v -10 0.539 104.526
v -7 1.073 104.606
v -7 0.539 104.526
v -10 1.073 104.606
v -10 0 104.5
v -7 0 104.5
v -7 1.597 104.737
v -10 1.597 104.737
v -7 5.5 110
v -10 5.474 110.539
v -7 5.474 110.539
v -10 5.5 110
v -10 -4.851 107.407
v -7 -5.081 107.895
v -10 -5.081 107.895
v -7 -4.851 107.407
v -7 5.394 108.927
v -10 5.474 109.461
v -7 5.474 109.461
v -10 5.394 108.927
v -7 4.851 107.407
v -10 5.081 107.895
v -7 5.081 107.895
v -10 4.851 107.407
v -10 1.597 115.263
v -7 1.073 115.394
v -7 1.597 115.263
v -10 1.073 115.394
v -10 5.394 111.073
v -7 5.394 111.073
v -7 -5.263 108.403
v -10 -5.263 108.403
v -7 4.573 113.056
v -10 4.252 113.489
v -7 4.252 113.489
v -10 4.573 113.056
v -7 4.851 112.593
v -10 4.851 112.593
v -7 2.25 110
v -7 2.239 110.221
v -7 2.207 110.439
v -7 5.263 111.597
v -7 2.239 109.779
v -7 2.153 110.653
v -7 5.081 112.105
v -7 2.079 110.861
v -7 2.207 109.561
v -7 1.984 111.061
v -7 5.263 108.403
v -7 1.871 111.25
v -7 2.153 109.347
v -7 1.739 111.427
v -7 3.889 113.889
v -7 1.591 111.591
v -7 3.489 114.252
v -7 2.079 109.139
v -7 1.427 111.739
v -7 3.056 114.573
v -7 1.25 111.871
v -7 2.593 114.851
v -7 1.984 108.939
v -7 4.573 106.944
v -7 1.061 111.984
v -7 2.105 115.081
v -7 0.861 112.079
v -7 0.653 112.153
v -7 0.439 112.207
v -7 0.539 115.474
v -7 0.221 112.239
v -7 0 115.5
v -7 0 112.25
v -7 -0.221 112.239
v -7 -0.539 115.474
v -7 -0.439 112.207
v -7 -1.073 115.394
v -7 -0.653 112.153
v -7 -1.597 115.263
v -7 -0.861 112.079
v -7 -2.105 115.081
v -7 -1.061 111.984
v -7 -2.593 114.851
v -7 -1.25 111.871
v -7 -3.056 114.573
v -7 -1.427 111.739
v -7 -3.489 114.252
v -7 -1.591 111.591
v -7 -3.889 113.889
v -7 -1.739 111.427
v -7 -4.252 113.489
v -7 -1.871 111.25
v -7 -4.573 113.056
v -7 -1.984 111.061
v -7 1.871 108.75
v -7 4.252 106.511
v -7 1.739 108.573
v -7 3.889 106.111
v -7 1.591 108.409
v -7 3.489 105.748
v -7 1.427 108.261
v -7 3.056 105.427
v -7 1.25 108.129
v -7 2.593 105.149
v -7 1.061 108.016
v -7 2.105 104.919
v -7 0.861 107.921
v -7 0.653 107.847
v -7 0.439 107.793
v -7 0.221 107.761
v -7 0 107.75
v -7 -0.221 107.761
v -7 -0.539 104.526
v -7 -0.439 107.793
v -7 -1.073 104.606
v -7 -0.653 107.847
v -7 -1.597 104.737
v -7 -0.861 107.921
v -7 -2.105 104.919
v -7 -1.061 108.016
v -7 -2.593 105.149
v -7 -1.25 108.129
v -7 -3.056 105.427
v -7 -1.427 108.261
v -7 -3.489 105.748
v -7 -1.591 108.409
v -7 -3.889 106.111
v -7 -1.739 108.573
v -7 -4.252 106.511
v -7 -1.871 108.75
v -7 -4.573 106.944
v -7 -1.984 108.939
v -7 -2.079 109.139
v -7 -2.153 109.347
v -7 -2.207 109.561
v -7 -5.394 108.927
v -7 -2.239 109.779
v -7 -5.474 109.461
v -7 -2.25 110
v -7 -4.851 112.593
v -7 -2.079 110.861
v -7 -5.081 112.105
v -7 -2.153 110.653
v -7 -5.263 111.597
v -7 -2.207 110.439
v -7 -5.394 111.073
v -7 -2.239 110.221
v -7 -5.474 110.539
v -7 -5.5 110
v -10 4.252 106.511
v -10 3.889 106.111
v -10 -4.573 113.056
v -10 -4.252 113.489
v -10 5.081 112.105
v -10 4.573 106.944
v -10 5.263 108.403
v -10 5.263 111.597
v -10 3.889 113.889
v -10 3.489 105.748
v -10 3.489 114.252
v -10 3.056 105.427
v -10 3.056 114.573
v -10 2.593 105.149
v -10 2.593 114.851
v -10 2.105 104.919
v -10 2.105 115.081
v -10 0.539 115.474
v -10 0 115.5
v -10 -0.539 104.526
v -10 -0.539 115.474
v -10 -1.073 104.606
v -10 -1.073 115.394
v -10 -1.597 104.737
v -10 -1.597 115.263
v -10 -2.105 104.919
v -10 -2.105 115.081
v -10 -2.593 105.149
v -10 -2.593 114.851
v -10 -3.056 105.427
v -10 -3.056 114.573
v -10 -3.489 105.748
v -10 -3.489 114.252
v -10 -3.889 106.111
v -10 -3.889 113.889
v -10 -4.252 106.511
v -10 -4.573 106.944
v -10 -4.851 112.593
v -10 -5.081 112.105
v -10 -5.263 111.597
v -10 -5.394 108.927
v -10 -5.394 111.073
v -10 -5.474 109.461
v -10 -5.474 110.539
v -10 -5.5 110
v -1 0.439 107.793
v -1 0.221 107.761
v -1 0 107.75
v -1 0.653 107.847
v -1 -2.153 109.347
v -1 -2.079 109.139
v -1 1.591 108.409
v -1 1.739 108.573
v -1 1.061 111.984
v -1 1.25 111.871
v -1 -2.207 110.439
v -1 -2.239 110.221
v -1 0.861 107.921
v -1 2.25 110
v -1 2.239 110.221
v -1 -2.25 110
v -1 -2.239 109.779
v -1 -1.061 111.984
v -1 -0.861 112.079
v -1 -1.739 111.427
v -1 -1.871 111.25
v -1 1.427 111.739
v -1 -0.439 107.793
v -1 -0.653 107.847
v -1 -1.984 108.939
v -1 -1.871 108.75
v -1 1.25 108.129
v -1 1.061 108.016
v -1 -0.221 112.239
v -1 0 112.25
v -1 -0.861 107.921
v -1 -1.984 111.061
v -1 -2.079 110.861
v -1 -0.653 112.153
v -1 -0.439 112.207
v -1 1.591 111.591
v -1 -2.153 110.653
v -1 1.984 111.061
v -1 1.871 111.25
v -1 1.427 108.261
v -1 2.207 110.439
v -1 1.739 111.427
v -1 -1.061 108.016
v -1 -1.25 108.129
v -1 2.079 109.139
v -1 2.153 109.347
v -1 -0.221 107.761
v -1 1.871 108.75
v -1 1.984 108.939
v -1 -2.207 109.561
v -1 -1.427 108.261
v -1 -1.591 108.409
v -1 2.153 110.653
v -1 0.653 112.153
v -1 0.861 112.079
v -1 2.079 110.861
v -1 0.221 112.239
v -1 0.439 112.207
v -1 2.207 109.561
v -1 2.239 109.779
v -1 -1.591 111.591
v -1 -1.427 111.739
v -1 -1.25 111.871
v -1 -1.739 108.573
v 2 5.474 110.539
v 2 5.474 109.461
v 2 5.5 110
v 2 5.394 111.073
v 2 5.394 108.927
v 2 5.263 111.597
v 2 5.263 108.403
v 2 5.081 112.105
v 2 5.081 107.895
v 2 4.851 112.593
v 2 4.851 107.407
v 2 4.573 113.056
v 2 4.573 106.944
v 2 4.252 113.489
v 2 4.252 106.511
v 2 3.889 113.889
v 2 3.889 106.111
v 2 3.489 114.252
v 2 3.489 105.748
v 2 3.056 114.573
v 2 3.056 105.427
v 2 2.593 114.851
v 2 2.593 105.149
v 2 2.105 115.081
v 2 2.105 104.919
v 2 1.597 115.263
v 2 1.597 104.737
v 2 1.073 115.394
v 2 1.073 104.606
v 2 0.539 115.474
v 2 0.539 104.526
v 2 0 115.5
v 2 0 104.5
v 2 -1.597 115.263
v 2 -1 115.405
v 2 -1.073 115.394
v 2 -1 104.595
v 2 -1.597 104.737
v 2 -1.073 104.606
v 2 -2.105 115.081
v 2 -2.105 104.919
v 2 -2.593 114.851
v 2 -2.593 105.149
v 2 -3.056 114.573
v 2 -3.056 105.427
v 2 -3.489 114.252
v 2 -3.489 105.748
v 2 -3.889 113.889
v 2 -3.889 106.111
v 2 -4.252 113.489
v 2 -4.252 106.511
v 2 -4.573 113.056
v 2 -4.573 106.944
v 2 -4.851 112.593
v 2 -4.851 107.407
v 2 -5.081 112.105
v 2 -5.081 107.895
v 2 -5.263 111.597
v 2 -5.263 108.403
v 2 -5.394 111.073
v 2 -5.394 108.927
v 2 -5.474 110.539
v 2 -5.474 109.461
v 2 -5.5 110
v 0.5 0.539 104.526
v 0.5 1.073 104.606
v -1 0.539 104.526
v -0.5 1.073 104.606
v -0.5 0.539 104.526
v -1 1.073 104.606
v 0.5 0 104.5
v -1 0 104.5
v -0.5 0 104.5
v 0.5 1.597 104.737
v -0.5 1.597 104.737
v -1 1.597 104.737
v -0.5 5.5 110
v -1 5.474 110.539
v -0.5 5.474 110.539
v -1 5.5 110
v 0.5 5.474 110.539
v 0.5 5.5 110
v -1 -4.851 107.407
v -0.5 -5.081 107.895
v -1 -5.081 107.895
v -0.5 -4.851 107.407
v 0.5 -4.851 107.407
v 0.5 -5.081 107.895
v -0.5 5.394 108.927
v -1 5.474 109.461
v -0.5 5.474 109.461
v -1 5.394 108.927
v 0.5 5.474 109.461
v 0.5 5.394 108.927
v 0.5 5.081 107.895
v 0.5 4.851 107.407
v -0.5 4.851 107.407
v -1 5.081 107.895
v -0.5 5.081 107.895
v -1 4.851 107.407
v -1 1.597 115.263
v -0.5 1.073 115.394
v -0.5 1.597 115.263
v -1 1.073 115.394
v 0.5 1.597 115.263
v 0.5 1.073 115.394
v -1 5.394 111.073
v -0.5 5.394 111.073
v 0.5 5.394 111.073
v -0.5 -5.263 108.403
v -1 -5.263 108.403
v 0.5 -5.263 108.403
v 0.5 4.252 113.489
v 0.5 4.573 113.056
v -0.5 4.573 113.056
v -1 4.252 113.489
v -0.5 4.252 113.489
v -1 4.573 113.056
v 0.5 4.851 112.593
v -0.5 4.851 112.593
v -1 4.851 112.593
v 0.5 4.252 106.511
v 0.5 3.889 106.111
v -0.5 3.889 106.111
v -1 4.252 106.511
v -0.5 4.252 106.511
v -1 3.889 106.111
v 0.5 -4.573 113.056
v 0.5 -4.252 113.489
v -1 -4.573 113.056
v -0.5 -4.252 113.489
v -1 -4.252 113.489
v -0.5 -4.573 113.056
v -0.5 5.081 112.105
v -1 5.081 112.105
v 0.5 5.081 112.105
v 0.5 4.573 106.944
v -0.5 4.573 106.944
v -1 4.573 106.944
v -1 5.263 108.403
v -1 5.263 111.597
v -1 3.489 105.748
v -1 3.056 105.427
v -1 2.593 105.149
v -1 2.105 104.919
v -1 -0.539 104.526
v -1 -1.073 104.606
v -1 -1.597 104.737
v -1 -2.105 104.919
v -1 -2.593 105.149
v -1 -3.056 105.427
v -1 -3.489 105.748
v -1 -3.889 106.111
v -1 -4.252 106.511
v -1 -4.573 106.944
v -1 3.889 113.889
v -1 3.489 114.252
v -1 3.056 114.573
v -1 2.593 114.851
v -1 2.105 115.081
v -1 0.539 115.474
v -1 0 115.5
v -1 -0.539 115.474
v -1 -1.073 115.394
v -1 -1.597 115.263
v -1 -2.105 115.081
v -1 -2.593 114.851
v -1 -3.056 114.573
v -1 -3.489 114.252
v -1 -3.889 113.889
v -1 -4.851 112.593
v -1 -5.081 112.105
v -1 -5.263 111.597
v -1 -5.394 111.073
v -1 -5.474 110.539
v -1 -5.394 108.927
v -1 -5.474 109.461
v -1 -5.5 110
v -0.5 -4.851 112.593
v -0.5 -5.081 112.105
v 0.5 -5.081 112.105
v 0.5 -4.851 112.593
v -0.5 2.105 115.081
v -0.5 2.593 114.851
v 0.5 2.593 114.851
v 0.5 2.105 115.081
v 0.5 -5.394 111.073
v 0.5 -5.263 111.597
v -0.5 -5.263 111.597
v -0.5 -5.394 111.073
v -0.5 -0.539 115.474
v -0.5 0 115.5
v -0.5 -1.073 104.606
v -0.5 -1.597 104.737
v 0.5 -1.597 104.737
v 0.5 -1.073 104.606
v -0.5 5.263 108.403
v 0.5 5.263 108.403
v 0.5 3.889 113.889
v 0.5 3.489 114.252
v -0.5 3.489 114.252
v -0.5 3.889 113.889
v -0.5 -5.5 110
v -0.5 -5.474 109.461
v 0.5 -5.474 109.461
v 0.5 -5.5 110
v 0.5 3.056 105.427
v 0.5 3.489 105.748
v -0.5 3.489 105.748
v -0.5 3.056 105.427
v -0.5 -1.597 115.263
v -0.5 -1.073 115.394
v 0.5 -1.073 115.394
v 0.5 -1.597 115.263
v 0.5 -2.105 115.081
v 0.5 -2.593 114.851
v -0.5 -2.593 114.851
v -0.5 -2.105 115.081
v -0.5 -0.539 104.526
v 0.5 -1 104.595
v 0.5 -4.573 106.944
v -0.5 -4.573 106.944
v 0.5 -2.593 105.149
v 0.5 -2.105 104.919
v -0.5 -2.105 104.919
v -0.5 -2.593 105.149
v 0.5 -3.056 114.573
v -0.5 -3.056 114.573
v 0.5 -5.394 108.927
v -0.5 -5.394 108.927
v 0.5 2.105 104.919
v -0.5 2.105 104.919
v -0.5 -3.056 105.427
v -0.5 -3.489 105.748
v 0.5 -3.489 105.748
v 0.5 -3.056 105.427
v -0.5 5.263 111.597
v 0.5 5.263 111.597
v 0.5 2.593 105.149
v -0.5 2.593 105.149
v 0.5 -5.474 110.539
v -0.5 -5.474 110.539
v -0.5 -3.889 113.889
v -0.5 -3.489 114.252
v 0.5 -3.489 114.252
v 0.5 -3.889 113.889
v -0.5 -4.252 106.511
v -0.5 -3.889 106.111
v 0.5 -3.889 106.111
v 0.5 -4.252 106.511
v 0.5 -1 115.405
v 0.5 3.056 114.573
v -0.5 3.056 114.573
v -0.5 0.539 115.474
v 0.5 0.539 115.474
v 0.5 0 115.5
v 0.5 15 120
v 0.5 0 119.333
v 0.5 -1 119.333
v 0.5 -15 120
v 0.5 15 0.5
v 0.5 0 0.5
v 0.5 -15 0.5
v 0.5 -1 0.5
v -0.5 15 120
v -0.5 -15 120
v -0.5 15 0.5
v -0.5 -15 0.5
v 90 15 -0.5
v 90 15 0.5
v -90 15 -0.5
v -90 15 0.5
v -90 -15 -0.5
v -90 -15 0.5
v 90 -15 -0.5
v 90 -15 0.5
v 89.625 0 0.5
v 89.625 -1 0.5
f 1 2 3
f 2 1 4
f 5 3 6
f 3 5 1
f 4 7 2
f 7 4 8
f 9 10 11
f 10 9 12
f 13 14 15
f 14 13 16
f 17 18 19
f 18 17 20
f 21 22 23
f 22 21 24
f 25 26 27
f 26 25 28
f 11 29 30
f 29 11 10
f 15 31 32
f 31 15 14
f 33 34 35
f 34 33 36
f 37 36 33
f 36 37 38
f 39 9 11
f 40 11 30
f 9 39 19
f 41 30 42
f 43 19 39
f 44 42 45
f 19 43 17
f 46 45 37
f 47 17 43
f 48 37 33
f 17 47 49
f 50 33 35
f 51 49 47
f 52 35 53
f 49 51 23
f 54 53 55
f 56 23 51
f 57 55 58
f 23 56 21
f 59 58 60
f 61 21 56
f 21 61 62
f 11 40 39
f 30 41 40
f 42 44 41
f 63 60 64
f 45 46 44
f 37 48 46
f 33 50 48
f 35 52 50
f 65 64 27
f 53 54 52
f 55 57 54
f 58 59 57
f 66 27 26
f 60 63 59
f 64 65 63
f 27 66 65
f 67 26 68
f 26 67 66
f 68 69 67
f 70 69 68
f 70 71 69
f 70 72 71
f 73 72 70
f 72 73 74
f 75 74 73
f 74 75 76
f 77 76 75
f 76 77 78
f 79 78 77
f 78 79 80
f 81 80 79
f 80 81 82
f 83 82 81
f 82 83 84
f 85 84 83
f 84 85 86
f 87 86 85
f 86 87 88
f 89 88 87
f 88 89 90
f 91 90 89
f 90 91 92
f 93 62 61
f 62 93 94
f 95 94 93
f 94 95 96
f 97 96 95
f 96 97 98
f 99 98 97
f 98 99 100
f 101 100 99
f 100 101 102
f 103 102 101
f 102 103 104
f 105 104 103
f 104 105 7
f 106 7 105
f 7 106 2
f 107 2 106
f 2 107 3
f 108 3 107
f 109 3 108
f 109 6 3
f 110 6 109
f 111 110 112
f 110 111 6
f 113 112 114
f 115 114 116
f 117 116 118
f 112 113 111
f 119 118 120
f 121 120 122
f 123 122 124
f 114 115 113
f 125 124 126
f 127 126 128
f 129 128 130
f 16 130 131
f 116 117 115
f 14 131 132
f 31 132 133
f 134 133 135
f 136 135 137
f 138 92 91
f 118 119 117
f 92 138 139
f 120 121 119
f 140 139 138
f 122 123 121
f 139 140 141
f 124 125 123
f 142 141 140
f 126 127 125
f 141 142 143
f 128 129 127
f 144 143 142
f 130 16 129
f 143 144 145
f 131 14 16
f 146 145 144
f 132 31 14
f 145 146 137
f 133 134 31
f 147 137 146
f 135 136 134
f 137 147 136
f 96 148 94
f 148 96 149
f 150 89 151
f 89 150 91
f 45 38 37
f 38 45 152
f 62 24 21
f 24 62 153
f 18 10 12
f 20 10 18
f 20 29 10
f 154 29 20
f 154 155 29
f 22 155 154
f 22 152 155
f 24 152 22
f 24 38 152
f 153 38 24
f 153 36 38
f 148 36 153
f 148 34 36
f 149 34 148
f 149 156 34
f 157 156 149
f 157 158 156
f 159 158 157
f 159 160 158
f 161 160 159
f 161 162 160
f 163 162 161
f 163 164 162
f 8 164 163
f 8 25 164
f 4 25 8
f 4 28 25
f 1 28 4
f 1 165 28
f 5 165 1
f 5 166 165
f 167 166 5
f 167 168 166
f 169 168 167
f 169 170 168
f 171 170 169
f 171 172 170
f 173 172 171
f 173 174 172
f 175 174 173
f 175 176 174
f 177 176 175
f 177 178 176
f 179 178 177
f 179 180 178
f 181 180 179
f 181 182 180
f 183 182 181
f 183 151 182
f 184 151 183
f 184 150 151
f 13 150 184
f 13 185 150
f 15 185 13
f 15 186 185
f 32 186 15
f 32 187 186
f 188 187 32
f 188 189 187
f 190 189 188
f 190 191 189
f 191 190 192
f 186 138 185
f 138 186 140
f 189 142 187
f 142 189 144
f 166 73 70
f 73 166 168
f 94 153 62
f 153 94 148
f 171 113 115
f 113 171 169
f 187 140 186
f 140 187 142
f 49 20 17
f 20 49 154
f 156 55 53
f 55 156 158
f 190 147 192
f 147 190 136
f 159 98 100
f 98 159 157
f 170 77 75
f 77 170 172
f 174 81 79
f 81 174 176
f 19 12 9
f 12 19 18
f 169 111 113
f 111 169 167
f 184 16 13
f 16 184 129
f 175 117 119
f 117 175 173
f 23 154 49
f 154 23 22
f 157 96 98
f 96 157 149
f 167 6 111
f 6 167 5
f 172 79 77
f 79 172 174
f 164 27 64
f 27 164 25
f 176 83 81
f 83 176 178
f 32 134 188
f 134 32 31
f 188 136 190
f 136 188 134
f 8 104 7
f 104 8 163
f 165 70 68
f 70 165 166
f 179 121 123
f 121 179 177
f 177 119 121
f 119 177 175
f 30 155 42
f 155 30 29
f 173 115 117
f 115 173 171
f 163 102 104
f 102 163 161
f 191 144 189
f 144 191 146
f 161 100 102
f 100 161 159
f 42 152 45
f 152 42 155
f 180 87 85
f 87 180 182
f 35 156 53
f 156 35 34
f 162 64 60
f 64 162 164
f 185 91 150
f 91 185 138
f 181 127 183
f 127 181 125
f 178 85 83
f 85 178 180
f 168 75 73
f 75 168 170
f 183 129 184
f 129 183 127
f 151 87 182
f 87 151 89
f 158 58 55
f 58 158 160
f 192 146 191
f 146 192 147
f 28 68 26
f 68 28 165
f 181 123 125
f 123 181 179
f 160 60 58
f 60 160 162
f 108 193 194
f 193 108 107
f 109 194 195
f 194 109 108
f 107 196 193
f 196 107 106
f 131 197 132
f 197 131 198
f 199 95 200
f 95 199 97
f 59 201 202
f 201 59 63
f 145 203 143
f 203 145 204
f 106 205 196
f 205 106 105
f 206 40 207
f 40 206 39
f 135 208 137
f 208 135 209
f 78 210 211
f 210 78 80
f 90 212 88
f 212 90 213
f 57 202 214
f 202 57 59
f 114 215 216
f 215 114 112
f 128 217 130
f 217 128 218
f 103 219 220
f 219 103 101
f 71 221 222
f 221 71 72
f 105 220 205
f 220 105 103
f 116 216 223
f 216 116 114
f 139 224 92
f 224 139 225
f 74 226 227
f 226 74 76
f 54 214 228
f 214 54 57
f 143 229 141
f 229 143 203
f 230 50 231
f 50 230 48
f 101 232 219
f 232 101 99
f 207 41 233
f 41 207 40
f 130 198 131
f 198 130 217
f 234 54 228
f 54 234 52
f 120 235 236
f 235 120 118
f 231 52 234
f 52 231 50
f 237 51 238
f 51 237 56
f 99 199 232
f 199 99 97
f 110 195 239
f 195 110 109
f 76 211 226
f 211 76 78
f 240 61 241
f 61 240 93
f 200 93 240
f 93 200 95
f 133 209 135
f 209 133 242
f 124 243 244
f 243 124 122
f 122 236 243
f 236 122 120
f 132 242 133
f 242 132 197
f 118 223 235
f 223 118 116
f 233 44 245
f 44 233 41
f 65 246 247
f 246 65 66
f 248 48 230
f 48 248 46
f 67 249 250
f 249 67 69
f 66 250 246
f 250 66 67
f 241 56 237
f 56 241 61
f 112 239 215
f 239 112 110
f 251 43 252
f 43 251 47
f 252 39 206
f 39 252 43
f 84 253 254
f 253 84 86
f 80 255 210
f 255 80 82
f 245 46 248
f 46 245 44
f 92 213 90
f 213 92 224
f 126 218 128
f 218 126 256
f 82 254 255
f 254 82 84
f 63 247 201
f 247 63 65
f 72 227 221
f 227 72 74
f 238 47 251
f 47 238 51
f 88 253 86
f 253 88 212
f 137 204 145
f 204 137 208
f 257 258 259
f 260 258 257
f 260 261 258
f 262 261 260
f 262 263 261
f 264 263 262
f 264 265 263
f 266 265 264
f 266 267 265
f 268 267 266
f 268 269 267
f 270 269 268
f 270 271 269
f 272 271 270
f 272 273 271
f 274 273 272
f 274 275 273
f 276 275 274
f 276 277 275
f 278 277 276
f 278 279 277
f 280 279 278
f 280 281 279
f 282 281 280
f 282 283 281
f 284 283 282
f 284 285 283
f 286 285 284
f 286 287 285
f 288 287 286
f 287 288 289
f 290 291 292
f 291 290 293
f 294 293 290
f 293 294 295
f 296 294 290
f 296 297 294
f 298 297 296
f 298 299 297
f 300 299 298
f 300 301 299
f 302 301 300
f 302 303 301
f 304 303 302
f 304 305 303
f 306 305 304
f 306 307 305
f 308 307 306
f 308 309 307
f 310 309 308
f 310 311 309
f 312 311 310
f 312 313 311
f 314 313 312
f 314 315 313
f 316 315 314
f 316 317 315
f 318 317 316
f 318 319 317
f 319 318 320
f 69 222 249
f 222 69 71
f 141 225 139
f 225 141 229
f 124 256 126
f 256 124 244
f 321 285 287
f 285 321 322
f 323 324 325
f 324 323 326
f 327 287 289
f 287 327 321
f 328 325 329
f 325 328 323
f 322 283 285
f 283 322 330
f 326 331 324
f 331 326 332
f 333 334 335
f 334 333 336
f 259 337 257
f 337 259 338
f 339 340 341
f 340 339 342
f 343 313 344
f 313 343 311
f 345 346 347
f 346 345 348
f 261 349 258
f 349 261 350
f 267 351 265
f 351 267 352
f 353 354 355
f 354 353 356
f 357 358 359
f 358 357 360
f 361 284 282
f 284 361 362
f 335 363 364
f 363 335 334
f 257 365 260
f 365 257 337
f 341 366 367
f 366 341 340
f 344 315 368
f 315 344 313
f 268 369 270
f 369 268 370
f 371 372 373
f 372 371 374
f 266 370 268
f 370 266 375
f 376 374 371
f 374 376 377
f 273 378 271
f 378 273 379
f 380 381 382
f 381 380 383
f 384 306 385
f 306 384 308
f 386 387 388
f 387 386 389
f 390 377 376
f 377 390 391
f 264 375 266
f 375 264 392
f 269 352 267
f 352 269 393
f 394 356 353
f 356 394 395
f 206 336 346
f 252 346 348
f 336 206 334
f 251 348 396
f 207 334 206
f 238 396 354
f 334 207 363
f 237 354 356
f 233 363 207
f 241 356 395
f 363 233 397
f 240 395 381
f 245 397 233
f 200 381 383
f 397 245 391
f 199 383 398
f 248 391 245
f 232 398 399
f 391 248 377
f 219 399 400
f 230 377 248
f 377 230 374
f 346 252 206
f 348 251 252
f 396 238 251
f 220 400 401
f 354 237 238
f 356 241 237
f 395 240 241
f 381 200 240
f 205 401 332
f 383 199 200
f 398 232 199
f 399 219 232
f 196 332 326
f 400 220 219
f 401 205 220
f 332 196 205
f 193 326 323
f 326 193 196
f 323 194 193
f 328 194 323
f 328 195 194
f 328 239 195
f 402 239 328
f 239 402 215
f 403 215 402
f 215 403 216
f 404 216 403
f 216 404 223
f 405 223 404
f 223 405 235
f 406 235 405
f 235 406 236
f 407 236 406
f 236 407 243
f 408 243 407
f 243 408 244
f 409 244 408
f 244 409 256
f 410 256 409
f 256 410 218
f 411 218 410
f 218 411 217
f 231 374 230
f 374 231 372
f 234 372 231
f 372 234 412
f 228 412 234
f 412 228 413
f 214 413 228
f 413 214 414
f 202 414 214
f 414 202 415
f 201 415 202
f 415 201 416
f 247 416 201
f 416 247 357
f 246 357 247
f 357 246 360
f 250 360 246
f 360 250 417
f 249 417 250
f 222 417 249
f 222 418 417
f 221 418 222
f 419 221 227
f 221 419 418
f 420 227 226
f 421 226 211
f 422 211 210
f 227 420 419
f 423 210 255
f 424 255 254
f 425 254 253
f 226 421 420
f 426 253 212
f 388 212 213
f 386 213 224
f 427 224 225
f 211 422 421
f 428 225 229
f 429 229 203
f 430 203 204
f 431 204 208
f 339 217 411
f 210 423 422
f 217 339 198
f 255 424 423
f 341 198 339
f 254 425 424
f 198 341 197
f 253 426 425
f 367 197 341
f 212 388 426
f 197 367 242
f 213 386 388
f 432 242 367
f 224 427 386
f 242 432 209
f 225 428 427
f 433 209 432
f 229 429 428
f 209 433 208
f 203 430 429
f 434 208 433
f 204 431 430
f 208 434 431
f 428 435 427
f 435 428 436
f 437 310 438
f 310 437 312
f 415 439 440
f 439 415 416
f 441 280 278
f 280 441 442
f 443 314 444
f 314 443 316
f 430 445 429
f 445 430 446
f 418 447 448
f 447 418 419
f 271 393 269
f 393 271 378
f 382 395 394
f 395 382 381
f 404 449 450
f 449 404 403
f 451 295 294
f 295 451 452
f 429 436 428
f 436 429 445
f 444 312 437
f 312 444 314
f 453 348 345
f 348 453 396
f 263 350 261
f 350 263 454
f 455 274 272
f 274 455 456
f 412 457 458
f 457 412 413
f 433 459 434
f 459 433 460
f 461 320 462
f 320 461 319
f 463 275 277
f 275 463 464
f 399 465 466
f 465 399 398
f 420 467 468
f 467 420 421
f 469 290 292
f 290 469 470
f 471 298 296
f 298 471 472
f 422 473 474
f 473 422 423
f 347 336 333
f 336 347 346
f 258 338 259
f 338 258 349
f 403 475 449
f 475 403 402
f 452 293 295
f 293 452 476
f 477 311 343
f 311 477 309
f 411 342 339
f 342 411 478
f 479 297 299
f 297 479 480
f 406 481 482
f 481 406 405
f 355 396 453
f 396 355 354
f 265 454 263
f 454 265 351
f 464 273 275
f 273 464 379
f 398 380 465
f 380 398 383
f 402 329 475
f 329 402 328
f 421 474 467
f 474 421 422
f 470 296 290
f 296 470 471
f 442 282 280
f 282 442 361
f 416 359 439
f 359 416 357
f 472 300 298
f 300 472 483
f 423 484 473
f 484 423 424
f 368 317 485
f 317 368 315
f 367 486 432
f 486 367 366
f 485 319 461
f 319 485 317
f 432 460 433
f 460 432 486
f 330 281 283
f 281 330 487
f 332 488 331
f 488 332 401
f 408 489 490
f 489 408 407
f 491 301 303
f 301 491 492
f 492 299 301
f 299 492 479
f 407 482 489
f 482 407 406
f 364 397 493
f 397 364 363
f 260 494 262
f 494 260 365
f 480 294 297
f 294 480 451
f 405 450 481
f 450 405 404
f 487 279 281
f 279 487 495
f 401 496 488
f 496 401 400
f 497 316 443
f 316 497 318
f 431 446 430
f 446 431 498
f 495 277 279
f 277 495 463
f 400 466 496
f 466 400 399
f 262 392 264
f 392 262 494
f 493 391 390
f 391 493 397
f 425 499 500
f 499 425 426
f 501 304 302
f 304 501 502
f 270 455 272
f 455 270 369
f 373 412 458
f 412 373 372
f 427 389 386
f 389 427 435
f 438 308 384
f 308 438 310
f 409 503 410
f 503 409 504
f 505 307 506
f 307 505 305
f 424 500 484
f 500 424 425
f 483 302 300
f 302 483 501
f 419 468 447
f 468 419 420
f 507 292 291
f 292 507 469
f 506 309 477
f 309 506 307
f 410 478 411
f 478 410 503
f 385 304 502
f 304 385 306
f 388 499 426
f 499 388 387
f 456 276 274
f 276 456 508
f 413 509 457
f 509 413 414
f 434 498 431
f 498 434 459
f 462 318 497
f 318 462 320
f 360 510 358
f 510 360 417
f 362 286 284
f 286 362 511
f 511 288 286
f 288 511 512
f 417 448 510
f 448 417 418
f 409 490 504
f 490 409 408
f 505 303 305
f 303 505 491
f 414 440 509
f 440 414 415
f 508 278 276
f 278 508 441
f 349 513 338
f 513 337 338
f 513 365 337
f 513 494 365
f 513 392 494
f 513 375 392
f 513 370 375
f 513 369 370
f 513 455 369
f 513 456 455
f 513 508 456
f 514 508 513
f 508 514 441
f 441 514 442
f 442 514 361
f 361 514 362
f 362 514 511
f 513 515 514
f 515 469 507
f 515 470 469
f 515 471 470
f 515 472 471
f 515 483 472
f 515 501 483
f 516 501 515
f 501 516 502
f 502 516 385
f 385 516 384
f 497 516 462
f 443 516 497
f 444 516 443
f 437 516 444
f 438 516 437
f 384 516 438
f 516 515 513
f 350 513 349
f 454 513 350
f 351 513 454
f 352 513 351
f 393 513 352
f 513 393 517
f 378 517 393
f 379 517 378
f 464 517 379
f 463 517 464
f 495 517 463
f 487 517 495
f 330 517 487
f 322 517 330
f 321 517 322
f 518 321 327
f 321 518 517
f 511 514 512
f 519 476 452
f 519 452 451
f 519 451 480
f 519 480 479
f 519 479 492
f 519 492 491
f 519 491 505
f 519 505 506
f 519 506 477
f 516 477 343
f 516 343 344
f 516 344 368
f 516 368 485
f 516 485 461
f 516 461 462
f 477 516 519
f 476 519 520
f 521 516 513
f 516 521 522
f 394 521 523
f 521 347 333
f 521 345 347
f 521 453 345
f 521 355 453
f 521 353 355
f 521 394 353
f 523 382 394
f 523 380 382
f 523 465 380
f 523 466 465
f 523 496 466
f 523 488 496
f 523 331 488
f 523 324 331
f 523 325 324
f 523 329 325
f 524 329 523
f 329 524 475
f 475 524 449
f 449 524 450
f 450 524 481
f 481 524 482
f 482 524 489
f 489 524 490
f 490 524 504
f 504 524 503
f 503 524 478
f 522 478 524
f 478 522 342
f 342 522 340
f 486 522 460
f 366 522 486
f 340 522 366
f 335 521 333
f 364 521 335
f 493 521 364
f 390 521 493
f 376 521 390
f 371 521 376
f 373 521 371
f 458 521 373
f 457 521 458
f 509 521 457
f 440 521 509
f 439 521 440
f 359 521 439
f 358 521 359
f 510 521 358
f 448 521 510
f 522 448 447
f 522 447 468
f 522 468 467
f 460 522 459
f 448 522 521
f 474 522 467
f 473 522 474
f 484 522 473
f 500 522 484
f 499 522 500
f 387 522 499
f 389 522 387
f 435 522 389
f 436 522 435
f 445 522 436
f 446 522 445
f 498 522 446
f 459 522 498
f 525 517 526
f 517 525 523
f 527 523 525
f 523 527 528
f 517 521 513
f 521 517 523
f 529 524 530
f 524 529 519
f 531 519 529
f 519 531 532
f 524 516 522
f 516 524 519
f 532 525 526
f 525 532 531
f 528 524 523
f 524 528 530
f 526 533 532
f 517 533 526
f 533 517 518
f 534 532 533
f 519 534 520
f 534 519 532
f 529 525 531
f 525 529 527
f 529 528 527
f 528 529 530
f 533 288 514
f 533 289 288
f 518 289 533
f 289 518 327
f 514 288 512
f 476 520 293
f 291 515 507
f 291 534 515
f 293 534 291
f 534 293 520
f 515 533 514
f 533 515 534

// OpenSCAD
// file: screwhang.scad
module screwhang()
{
    translate([0,0,1.5])cylinder(d=11, h=3,center=true, $fn=64);
    translate([0,0,6])cylinder(d=4.5, h=12, center=true, $fn=64);
    translate([0,0,10.5])cylinder(d=11, h=3,center=true, $fn=64);
}
// main file
use <screwhang.scad>

thickness=1;

module right_angle_prism(l, w, h) {
    linear_extrude(height = h) {
        polygon(points=[[0,0],[l,0],[0,w]], paths=[[0,1,2]]);
    }
}

module back()
{
    translate([0,0,60])cube([thickness,30,120],center=true);
}

module foot()
{
    cube([180,30,thickness],center=true);    
}

back();
foot();
translate([-12+3-thickness,0,110])rotate([0,90,0])screwhang();
rotate([90,0,0])right_angle_prism(90,120,thickness);
